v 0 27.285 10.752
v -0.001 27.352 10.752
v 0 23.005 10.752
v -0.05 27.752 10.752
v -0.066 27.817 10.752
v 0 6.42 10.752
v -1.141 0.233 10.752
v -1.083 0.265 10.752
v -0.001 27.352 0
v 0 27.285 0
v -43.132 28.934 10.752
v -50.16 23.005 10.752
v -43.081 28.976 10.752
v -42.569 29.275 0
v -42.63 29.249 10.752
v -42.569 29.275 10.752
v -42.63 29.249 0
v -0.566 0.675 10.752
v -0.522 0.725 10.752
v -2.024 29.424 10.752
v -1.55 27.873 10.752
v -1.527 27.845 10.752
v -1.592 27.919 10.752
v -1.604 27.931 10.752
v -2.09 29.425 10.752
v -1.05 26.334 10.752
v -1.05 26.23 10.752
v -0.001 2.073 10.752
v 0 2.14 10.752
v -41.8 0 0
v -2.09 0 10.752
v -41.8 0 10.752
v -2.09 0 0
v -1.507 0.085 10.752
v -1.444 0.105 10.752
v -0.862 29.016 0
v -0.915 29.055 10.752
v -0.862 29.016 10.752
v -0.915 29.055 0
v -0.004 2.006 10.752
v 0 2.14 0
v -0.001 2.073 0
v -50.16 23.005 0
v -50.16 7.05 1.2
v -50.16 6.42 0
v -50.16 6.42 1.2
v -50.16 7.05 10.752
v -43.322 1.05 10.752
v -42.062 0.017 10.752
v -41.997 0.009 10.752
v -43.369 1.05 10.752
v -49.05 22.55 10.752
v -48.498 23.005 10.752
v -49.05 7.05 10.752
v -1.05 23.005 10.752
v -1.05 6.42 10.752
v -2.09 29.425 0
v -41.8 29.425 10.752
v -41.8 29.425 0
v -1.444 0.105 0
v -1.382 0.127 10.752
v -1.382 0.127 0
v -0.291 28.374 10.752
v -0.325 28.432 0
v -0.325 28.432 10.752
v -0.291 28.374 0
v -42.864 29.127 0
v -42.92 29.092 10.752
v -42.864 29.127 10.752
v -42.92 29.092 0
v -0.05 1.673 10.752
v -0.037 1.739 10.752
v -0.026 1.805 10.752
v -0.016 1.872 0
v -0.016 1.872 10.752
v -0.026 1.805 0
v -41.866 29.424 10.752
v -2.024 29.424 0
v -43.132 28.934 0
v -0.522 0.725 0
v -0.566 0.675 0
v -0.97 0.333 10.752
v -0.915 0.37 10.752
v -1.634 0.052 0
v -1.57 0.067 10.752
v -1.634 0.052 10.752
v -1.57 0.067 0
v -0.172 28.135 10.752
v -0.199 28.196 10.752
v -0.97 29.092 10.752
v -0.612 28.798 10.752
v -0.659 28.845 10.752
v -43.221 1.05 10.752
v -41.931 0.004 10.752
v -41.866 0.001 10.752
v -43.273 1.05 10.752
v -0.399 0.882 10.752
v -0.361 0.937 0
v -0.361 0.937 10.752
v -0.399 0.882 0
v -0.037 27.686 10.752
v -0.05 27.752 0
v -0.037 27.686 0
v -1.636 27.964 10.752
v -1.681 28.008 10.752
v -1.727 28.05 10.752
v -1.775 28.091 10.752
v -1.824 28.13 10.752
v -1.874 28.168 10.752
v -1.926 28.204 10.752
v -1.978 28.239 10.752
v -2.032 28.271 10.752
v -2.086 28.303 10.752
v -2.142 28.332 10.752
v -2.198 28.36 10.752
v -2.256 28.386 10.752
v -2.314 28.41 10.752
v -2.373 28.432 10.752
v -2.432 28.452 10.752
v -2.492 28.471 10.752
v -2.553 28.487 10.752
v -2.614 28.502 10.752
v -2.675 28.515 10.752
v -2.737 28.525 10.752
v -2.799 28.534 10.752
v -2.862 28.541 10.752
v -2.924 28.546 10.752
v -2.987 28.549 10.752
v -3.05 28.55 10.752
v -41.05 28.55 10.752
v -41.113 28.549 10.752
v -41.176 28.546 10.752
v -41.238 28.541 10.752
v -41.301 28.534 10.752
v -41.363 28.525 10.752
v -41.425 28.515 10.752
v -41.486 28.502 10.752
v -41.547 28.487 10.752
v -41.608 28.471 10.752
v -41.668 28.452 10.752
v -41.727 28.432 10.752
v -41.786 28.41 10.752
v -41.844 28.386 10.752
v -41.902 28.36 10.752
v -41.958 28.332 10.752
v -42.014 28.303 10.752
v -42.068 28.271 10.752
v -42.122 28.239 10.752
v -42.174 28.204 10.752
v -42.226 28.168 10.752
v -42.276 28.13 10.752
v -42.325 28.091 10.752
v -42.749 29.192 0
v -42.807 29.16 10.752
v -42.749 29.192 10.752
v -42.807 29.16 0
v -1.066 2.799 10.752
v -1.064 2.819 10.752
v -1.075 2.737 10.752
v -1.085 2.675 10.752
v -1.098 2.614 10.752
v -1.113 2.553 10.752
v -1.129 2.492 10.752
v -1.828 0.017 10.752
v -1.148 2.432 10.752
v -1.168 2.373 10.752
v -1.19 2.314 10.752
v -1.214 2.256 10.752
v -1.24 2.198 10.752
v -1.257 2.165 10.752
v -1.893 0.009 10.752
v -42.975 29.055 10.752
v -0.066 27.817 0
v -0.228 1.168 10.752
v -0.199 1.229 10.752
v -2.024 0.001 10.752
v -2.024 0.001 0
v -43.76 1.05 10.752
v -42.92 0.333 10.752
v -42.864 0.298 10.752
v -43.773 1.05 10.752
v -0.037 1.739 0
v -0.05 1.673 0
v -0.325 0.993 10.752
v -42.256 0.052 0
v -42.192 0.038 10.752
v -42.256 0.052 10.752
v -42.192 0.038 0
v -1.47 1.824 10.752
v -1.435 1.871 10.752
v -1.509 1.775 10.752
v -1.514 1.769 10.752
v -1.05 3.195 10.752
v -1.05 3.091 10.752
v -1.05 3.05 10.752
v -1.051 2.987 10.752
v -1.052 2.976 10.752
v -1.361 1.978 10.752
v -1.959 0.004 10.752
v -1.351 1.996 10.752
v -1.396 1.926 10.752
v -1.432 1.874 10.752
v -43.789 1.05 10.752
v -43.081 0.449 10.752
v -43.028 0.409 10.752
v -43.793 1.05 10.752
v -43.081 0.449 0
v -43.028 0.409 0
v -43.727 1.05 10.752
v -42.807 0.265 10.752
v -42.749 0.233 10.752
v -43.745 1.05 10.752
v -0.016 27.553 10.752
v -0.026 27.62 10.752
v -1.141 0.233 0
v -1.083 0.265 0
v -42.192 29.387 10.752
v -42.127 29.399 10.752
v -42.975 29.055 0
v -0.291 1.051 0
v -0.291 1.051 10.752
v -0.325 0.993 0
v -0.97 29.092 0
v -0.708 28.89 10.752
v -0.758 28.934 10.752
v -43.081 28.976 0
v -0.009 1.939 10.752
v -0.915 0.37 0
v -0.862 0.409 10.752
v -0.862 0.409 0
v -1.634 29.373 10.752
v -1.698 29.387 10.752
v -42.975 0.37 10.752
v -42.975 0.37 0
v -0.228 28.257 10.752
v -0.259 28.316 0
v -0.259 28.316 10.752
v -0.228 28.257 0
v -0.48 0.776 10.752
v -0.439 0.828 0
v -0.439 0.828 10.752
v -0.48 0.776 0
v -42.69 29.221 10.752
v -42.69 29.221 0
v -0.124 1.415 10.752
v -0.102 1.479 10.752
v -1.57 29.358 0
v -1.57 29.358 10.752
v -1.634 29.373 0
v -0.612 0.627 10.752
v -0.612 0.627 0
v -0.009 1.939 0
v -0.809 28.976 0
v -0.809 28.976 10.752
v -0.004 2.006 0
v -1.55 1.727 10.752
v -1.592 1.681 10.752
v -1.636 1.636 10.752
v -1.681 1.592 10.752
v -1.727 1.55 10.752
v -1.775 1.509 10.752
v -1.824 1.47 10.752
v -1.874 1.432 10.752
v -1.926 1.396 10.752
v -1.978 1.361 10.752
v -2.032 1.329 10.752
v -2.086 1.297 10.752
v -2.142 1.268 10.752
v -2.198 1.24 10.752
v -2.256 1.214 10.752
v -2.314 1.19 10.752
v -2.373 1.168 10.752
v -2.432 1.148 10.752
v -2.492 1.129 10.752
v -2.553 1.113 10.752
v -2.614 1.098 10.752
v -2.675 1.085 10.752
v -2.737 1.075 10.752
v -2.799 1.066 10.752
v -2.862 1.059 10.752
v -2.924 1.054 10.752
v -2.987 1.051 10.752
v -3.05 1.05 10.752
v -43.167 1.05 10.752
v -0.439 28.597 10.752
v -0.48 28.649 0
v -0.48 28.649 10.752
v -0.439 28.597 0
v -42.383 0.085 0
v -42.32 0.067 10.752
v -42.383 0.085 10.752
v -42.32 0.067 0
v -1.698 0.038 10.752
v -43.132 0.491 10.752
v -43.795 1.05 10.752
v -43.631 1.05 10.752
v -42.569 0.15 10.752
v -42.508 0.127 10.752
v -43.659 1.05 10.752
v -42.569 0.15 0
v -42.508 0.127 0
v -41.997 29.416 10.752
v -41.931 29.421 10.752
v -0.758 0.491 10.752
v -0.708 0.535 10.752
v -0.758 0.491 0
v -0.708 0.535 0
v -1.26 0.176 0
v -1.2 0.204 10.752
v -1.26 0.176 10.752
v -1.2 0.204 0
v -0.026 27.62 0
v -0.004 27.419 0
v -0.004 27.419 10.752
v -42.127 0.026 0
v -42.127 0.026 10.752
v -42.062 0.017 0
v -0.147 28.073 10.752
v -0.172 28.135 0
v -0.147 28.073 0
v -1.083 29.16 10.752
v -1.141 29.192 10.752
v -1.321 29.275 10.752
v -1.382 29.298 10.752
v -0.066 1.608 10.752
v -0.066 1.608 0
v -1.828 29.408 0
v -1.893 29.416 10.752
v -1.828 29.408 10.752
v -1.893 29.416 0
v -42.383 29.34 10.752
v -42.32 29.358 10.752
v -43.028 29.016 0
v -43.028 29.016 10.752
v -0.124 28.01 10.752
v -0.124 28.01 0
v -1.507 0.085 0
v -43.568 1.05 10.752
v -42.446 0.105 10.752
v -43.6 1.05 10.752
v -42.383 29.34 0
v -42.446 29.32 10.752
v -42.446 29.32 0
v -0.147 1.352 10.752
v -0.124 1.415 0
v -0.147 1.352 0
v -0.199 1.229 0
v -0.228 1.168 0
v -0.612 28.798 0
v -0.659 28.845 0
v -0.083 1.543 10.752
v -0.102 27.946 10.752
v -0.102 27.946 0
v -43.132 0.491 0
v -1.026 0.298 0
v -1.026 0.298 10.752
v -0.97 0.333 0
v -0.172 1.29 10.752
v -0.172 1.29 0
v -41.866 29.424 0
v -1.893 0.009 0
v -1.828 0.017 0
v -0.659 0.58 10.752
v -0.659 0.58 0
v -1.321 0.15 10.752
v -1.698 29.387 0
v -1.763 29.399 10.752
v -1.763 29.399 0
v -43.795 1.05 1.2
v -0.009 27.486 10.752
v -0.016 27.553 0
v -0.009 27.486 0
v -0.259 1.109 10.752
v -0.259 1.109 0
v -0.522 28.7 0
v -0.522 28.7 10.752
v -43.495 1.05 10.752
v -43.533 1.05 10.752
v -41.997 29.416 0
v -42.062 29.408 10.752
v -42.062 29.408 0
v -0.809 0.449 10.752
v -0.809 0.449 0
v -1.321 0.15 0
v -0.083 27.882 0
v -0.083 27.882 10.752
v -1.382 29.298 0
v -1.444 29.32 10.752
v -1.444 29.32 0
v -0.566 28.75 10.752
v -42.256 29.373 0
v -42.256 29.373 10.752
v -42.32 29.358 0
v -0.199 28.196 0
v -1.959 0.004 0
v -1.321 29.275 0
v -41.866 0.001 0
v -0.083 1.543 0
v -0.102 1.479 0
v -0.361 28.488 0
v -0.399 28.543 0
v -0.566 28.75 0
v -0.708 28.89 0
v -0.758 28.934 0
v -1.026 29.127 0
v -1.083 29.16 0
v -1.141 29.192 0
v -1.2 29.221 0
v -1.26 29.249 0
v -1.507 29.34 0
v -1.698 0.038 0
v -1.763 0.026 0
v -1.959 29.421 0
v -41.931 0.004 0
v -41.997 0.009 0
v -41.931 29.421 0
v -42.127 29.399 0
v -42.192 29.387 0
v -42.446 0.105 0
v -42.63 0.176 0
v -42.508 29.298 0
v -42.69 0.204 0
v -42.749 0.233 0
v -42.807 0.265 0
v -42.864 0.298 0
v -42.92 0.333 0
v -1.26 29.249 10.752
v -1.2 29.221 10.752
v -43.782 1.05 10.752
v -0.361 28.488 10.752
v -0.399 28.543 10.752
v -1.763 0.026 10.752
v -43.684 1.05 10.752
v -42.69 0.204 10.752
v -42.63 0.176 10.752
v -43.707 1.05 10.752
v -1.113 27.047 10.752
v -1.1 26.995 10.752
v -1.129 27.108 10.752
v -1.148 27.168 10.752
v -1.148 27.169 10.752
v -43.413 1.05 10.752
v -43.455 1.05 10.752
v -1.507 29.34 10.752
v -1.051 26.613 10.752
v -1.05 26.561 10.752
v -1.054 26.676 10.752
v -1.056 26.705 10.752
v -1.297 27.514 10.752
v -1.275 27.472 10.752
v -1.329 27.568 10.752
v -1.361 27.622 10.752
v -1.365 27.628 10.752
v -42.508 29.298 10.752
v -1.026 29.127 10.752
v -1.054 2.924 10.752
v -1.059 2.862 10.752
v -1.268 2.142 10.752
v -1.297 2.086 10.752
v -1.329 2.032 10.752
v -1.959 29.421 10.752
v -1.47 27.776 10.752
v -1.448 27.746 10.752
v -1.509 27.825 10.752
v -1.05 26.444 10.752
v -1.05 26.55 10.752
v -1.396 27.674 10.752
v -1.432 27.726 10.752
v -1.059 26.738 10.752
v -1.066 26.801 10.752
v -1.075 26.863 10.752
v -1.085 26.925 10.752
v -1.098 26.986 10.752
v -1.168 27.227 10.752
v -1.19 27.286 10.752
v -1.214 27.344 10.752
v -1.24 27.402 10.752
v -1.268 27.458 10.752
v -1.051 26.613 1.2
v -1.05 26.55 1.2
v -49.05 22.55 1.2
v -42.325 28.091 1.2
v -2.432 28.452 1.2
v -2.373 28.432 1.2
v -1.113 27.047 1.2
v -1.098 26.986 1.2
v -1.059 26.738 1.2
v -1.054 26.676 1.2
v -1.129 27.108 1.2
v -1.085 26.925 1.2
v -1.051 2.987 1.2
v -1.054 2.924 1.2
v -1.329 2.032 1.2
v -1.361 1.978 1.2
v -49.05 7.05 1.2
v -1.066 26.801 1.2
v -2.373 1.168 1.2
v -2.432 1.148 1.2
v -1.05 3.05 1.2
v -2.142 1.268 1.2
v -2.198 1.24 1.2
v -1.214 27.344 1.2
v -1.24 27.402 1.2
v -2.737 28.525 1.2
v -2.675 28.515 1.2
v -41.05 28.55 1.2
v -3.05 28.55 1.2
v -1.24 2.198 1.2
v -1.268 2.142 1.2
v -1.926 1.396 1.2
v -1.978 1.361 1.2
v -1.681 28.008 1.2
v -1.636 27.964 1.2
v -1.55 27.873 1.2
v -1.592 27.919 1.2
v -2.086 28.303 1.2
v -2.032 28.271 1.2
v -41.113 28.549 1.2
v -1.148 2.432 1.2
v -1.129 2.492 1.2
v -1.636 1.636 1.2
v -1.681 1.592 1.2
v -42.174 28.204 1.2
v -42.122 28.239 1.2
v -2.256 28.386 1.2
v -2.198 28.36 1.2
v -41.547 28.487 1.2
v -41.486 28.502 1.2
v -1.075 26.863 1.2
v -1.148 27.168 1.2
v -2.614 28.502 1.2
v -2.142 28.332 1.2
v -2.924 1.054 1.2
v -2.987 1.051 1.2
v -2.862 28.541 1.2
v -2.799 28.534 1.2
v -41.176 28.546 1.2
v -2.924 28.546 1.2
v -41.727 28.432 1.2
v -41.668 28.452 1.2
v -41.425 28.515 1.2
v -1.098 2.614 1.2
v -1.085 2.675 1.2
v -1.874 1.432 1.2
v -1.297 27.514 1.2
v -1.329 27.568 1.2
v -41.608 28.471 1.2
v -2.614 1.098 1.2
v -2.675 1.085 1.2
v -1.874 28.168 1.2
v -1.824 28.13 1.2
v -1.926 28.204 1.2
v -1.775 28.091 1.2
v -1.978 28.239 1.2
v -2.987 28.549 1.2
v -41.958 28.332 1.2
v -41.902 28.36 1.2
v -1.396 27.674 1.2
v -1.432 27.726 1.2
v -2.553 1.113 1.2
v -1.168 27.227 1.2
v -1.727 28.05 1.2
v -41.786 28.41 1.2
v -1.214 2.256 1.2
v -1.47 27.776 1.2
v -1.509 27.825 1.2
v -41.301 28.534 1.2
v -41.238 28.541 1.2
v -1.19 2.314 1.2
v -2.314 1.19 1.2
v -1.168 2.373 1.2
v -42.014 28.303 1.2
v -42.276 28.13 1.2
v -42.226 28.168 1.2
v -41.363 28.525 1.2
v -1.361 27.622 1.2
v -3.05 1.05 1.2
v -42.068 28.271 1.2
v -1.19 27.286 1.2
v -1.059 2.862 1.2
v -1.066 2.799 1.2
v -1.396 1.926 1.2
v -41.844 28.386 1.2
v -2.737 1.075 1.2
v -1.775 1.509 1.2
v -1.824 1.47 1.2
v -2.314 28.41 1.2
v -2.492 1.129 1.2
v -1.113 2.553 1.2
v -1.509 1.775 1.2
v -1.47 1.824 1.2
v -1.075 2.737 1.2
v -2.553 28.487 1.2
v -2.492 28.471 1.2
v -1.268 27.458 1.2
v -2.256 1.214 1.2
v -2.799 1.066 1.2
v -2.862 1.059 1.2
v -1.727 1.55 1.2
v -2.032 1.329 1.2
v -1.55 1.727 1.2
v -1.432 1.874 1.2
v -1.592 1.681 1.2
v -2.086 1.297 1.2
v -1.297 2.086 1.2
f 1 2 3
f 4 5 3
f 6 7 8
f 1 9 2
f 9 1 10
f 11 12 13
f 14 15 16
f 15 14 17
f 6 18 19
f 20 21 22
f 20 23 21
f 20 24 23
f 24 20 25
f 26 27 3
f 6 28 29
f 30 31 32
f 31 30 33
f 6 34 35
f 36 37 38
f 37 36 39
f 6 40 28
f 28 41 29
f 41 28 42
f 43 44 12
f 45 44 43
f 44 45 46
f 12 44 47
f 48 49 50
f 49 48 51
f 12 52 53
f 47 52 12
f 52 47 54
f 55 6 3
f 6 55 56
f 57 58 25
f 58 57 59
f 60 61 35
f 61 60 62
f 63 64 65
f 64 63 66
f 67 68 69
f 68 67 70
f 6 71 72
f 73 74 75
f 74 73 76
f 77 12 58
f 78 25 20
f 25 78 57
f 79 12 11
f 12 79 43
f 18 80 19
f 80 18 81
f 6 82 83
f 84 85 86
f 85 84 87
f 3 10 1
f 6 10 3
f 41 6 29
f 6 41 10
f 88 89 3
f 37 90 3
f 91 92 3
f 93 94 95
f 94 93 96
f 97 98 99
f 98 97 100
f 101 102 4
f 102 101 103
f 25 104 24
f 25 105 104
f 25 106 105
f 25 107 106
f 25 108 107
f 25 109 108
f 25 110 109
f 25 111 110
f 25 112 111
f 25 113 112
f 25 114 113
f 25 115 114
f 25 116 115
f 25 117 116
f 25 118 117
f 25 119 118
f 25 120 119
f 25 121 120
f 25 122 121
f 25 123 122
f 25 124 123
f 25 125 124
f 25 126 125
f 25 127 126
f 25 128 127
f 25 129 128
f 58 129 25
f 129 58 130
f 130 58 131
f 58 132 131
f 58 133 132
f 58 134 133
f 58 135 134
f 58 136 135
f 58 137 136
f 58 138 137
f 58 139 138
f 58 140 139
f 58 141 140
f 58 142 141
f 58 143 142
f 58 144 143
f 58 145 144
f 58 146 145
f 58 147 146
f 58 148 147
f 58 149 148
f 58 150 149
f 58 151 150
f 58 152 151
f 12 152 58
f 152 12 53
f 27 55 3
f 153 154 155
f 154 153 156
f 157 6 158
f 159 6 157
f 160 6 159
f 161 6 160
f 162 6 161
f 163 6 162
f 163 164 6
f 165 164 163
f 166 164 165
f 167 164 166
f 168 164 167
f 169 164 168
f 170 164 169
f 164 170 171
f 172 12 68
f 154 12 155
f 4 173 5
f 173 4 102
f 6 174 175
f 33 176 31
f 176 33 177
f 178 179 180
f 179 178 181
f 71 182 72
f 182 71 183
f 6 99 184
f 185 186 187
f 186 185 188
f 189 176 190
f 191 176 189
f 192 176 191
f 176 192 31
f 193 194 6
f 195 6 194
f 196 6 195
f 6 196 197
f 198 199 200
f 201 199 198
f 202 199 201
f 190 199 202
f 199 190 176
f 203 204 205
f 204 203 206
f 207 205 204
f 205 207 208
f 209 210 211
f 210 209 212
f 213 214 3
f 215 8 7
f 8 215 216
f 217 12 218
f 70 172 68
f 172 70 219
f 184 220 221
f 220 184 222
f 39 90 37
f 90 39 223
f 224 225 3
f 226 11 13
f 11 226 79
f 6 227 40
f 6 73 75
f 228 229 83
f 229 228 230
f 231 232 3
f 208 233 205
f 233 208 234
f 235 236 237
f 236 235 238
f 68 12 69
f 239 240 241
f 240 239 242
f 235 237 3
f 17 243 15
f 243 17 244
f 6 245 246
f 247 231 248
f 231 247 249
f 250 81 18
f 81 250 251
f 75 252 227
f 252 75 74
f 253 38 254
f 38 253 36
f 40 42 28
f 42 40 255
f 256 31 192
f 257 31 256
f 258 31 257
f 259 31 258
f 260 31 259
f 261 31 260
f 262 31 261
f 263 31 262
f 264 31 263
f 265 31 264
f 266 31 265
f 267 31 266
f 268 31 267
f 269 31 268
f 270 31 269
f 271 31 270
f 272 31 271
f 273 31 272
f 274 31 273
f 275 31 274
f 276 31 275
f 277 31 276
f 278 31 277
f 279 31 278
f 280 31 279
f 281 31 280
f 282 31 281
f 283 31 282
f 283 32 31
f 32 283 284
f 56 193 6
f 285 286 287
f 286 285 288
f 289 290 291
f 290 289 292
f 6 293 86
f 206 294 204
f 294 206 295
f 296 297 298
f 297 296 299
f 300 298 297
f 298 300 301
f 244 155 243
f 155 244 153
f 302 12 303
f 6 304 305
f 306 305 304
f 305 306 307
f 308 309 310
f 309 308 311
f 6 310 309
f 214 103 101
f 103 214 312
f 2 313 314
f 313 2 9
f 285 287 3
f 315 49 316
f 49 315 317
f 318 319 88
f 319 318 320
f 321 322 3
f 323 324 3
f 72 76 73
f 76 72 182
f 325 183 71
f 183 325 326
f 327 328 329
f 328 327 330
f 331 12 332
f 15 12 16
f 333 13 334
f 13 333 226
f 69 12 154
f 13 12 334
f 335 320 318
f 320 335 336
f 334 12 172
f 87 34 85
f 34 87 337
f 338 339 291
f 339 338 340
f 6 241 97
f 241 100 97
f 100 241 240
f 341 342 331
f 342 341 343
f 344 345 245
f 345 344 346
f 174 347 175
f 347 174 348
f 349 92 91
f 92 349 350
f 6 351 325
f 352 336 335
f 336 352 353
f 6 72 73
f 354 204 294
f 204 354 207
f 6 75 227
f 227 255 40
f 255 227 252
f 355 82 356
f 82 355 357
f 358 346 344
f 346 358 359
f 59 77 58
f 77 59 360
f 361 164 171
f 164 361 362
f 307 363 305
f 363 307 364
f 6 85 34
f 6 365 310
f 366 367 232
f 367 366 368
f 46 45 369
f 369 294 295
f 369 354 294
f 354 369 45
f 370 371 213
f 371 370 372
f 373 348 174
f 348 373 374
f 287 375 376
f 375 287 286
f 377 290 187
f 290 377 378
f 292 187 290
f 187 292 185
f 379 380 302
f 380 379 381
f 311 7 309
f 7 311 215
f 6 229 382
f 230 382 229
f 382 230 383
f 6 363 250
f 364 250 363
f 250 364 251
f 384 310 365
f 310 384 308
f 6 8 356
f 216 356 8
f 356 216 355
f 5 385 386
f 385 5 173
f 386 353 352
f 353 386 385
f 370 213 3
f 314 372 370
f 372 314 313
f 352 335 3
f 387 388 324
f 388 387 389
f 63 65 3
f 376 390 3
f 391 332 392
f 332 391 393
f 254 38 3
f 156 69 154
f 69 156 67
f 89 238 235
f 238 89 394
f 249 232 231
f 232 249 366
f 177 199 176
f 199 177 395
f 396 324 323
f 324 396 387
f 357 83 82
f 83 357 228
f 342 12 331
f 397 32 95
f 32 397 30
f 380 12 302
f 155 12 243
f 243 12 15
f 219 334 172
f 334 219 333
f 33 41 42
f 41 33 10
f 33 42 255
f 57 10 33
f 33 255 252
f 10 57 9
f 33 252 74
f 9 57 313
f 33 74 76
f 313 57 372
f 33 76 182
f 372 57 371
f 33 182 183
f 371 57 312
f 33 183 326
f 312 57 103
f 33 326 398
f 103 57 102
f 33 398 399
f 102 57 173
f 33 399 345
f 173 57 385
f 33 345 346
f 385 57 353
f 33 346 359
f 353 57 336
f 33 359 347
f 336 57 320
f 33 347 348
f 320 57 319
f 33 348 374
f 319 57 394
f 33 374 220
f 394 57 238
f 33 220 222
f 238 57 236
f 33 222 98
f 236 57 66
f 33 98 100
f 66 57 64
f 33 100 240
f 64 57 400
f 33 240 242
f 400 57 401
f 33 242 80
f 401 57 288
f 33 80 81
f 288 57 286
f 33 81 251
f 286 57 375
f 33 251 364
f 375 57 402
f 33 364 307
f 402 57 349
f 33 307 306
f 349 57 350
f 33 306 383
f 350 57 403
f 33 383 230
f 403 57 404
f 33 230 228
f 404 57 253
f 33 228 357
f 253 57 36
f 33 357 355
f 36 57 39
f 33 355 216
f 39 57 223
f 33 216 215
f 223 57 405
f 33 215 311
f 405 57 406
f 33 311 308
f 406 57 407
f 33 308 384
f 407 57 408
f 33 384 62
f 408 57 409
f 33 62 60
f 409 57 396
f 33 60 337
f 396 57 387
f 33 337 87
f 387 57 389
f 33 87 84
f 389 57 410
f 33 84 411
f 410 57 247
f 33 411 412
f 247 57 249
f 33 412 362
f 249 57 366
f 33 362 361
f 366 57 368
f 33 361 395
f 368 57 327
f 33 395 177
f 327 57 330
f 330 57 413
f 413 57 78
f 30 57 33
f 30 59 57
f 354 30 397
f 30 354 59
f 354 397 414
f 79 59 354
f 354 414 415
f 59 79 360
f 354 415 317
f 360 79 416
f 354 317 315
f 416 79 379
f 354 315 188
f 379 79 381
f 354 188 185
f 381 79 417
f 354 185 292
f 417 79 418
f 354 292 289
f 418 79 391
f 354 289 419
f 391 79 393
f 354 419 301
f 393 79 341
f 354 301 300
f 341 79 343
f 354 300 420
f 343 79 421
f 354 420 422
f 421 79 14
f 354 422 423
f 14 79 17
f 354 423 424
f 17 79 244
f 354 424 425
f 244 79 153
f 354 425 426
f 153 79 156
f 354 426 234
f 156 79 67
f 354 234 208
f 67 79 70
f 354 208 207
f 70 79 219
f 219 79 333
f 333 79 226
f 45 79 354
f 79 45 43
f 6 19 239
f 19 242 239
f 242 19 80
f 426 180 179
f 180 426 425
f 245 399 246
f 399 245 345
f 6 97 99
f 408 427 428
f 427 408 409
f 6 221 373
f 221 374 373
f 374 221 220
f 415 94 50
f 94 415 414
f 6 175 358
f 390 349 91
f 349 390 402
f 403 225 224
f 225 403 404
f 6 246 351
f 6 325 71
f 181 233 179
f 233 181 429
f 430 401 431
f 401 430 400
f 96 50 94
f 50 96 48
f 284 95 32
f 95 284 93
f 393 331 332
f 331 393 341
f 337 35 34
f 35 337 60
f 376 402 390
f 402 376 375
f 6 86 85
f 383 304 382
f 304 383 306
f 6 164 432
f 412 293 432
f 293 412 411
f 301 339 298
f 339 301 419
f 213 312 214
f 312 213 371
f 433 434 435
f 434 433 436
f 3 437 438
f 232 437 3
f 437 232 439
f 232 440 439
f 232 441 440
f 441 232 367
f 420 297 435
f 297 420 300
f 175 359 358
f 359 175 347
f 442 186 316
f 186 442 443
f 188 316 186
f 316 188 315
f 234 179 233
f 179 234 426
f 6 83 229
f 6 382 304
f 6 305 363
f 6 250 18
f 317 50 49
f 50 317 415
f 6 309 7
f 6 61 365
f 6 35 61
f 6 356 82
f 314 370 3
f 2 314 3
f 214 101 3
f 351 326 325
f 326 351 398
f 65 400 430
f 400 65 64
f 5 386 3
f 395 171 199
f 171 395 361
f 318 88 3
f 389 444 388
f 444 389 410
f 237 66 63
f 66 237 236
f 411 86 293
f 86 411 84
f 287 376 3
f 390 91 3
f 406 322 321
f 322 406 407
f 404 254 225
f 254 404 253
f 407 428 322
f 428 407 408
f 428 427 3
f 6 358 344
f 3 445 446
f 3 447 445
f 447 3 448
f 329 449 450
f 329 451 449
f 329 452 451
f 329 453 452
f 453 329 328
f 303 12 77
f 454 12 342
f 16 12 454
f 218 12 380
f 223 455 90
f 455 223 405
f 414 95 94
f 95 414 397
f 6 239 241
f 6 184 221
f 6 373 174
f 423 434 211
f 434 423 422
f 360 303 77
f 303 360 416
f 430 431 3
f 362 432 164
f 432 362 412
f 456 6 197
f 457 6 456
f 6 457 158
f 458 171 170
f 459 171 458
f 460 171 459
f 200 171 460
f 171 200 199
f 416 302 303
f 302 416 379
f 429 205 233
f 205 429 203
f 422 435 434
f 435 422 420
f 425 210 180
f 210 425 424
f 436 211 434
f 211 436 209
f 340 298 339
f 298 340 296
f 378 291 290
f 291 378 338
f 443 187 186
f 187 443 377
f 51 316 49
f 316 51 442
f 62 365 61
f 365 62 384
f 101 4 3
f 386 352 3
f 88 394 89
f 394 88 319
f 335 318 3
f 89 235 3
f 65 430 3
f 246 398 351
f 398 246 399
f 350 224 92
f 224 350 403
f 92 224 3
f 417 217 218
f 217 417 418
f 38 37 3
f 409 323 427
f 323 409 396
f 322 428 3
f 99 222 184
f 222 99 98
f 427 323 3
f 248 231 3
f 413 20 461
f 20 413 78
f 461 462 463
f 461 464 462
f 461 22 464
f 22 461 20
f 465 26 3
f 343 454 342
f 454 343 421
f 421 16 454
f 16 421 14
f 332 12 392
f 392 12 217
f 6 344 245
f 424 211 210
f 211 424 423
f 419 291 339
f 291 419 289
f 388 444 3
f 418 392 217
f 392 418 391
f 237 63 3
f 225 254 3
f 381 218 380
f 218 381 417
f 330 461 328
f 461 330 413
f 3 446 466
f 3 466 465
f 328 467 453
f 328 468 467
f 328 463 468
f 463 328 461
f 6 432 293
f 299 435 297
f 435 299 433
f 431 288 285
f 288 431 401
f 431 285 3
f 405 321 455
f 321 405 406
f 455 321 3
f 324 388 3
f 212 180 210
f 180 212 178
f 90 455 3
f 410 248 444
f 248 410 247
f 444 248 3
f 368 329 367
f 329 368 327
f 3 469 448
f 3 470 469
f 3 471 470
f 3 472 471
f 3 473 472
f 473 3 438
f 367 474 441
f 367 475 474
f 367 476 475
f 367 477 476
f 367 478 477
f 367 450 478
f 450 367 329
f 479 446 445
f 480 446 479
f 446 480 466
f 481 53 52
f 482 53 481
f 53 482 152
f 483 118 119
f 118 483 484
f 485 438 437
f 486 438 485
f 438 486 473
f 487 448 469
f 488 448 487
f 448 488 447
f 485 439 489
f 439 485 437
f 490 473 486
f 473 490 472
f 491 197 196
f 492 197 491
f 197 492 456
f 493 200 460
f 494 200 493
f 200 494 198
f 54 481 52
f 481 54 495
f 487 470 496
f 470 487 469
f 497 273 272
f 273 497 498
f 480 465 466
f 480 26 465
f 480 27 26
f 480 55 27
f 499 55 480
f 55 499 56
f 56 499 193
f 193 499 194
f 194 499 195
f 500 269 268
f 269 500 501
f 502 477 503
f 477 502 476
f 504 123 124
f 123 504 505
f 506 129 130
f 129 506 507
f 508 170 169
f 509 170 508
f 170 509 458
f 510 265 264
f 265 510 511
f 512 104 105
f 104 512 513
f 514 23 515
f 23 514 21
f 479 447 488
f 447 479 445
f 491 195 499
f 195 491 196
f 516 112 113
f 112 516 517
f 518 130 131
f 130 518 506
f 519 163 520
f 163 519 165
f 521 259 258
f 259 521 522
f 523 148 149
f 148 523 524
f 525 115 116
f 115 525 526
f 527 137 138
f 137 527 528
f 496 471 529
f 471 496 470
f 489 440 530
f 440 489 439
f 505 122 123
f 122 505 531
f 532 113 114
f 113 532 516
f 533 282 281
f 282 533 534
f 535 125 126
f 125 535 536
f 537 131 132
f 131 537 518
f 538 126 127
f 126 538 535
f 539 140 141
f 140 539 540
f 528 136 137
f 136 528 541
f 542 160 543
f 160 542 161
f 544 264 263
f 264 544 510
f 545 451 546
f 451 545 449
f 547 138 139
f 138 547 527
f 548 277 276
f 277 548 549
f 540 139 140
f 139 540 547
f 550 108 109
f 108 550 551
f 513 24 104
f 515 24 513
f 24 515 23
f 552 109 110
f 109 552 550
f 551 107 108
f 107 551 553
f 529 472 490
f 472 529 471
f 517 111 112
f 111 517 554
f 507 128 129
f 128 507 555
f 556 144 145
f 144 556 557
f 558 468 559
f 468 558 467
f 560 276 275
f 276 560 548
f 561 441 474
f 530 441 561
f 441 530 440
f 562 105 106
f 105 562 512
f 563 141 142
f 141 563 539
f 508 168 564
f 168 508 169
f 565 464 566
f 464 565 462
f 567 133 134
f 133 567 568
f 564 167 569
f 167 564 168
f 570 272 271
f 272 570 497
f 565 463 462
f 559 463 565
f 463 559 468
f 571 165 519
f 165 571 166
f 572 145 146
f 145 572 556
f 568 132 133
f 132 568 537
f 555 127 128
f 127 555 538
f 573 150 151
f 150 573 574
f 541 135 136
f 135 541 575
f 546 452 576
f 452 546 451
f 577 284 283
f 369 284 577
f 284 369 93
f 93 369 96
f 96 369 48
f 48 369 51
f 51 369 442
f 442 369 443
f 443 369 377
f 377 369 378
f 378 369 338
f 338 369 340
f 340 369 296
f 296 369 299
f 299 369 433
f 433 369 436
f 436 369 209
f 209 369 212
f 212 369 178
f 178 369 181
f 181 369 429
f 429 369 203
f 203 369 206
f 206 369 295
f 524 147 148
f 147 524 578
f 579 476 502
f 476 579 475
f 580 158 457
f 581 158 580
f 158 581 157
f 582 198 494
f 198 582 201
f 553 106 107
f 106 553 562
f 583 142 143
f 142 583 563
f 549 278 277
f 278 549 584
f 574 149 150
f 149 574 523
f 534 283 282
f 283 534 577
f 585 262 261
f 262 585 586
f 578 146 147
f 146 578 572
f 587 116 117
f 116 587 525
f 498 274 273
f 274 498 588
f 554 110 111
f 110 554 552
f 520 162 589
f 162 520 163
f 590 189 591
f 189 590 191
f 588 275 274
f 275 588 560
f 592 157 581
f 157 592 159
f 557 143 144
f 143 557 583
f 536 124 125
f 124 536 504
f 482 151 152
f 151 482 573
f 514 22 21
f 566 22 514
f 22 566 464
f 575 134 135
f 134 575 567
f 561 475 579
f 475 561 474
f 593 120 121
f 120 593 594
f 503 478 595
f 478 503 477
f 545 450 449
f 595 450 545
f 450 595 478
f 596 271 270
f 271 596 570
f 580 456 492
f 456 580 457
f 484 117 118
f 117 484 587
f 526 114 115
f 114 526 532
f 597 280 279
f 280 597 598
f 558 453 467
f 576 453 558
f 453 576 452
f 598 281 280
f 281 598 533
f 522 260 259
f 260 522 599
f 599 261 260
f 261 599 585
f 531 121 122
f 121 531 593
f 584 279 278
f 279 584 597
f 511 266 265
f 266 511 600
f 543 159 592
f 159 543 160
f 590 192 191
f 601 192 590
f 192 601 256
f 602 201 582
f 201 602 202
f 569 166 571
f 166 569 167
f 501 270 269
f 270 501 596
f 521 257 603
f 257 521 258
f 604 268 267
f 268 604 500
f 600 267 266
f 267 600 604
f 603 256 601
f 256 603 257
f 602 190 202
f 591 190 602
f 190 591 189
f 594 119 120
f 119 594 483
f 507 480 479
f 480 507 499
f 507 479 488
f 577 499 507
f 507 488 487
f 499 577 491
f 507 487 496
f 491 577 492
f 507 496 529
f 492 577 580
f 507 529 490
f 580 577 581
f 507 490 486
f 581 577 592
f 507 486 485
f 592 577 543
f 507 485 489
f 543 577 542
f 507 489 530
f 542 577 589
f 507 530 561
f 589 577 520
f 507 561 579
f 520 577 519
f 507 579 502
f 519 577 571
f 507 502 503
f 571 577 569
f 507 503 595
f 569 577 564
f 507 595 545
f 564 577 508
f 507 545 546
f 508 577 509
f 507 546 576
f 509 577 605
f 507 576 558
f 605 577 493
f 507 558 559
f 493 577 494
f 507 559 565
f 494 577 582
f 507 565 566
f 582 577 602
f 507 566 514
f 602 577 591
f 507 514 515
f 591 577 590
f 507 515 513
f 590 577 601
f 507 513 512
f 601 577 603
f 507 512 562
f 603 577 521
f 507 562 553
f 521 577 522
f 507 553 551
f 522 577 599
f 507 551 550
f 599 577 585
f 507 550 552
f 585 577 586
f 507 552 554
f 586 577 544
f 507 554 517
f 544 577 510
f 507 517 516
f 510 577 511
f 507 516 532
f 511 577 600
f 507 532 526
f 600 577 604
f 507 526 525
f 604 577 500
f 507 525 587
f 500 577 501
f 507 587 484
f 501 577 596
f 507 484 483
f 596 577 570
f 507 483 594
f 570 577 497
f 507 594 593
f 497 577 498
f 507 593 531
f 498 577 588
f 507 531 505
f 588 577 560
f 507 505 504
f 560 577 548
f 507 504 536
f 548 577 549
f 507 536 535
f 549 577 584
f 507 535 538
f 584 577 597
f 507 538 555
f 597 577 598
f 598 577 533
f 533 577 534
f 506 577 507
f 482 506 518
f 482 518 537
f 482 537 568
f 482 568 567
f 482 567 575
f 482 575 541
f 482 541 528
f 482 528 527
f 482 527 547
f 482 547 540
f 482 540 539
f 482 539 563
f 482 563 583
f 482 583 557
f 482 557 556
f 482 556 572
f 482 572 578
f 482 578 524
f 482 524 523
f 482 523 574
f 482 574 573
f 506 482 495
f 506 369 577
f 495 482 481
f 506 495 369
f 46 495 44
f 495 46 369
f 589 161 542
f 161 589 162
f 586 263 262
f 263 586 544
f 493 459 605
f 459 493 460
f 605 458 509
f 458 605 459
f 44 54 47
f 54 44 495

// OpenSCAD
// file: ../sc.scad
// ShortCuts.scad 
// Autor: Rudolf Huttary, Berlin 2015
//
$fn = 100; 

//show_examples(); 

module show_examples()
	place_in_rect(30, 30)
	{
		Cy(h = 10); 
		CyH(h = 10); 
		CyH(h = 10, w = 30); 
		CyS(h = 10); 
		CyS(h = 10, w1 = 25, w2 = 75); 
		Cu(10); 
		Ri(h = 10); 
		RiH(h = 10); 
		RiS(h = 10, w1 = 10); 
		RiS(h = 10, w1 = 30, w2 = 300); 
		Sp(); 
		SpH(10, 30, 30); 
	}


module help()
{
echo("==============="); 
echo("help(): shows this help"); 
echo("show_examples(): shows some examples"); 
echo("place_in_rect(): places children objects in grid"); 
echo("Transformations:"); 
echo(" transform :  T(x=0, y=0, z=0), Tx(x=0) , Ty(y=0), Tz(z=0)"); 
echo(" rotate :  R(x=0, y=0, z=0), Rx(x=0) , Ry(y=0), Rz(z=0)"); 
echo(" scale :  S(x=1, y=1, z=1), Sx(x=1) , Sy(y=1), Sz(z=1)"); 
echo("Logical"); 
echo(" difference :  D()"); 
echo(" union :  U()"); 
echo(" intersection : *missing*"); 
echo("Primitives"); 
echo(" circle :  Ci(r=10)"); 
echo(" circle_half :  CiH(r=10, w=0)")
echo(" circle_segment :  CiS(r=10, w1=0, w2=90)")
echo(" square :  Sq(x=10, y=0, center=true))"); 
echo(" cylinder :  Cy(r=10, h=1, center=true)"); 
echo(" cylinder_half :  CyH(r=10, w=0)")
echo(" cylinder_segment: CyS(r=10, h=1, w1=0, w2=90,center=true)"); 
echo(" cylinder_segment: Pie(r=10, h=1, w1=0, w2=90,center=true)"); 
echo(" cube :  Cu(x=10, y=0, z=10, center=true)"); 
echo(" ring :  Ri(R=10, r=5, h=1, center=true)"); 
echo(" ring_half :  RiH(R=10, r=5, h=1, w=0 center=true)"); 
echo(" ring_segment :  RiS(R=10, r=5, h=1, w1=0, w2=90, center=true)"); 
echo(" sphere:  Sp(r=10))"); 
echo(" sphere_half:  SpH(r=10, w1 = 0, w2 = 0))"); 
echo("==============="); 
}

// Euclidean Transformations
module T(x=0, y=0, z=0){translate([x, y, z])children(); }
module Tx(x) { translate([x, 0, 0])children(); }
module Ty(y) { translate([0, y, 0])children(); }
module Tz(z) { translate([0, 0, z])children(); }

module R(x=0, y=0, z=0){rotate([x, y, z]) children();}
module Rx(x=90){rotate([x, 0, 0]) children();}
module Ry(y=90){rotate([0, y, 0]) children();}
module Rz(z=90){rotate([0, 0, z]) children();}

module M(x=0, y=0, z=0){mirror([x, y, z]) children();}
module Mx(x=1){mirror([x, 0, 0]) children();}
module My(y=1){mirror([0, y, 0]) children();}
module Mz(z=1){mirror([0, 0, z]) children();}

module S(x=1, y=1, z=1){scale([x, y, z]) children();}
module Sx(x=1){scale([x, 1, 1]) children();}
module Sy(y=1){scale([1, y, 1]) children();}
module Sz(z=1){scale([1, 1, z]) children();}

module D() difference(){children(0); children([1:$children-1]);}
module U() children([0:$children-1]);
// module I() intersection()children([0:$children-1]); // does not work for some reason


// primitives - 2D

module Sq(x =10, y = 0, center = false)
{
   if(y==0)
		square([x, x], center = center); 
	else
		square([x, y], center = center); 
}
module Ci(r = 10)
{
	circle(r = r); 
}

// derived primitives - 2d
module CiH(r = 10, w = 0)
  circle_half(r, w); 

module CiS(r = 10, w1 = 0, w2 = 90)
  circle_segment(r, w1, w2); 


// primitives - 3d
module Cy(r = 10, h = 1, center = false)
{
	cylinder(r = r, h = h, center = center); 
}
module Cu(x = 10, y = 0, z = 10, center = false)
{
  if (y==0)
	cube([x, x, x], center = center); 
  else
	cube([x, y, z], center = center); 
}

// derived primitives - 3d
module CyH(r = 10, h = 1, w = 0, center = false)
  cylinder_half(r, h, w, center); 

module CyS(r = 10, h = 1, w1 = 0, w2 = 90, center = false)
  cylinder_segment(r, h, w1, w2, center); 

module Ri(R = 10, r = 5, h = 1, center = false)
  ring(R, r, h, center); 

module RiS(R = 10, r = 5, h = 1, w1 = 0, w2 = 90, center = false)
   ring_segment(R, r, h, w1, w2, center); 

module RiH(r1 = 10, r2, h = 1, w = 0, center = false)
   ring_half(r1, r2, h, w, center); 
module Pie(r = 10, h = 1, w1 = 0, w2 = 90, center = false)
  cylinder_segment(r, h, w1, w2, center);  
module Sp(r = 10)
  sphere(r); 
module SpH(r = 10, w1 = 0, w2 = 0)
  sphere_half(r, w1, w2); 
module SpS(r = 10, w1 = 0, w2 = 90, w3 = 90)
  sphere_segment(r, w1, w2); 




// clear text definitions
module circle_half(r = 10, w = 0)
{
	difference()
	{
		circle(r); 
     rotate([0, 0, w-90])
     translate([0, -r])
		square([r, 2*r], center = false); 
	}
}

module circle_segment(r = 10, w1 = 0, w2 = 90)
{
  W2 = (w1>w2)?w2+360:w2; 
  if (W2-w1 < 180)
    intersection()
		{
       circle_half(r, w1); 
       circle_half(r, W2-180); 
 		}
	else
    union()
		{
       circle_half(r, w1); 
       circle_half(r, W2-180); 
 		}
}

module cylinder_half(r = 10, h = 1, w = 0, center = true)
{
  linear_extrude(height = h, center = center)
  circle_half(r, w); 
} 

module cylinder_segment(r = 10, h = 1, w1 = 0, w2 = 90, center = true)
{
  linear_extrude(height = h, center = center)
  circle_segment(r, w1, w2); 
} 

module ring(R = 10, r = 5, h = 1, center = true)
{
	difference()
	{
	cylinder(r = R, h = h, center = center); 
   translate([0, 0, -2*h])
	cylinder(r = r, h = 4*h, center = false); 
	}
}

module ring_half(R = 10, r = 5, h = 1, w = 0, center = true)
{
	difference()
	{
		ring(R, r, h, center); 
     rotate([0, 0, w])
     translate([0, -R/2, 0])
		cube([2*R, R, 3*h], center = true); 
	}
}

module ring_segment(R = 10, r = 5, h = 1, w1 = 0, w2 = 90, center = true)
{
  W2 = (w1>w2)?w2+360:w2; 
  if (W2-w1 < 180)
    intersection()
		{
       ring_half(R, r, h, w1, center); 
       ring_half(R, r, h, W2-180, center); 
 		}
	else
    union()
		{
       ring_half(R, r, h, w1, center); 
       ring_half(R, r, h, W2-180, center); 
 		}
}


module sphere_half(r = 10, w1 = 0, w2 = 0)
{  
	difference()
	{
   	sphere(r); 
      rotate([-w1, -w2, 0])
     	translate([0, 0, r])
		cube([2*r, 2*r, r], center = true); 
	}

}


// additional code
module place_in_rect(dx =20, dy=20)
{
  cols = ceil(sqrt($children)); 
  rows = floor(sqrt($children)); 
  for(i = [0:$children-1])
	{ 
	  T(dx*(-cols/2+(i%cols)+.5), dy*(rows/2-floor(i/cols)-.5))
		 children(i); 
	}
}
// main file
/* [Plug Options] */
//The width of the plug, in mm (The long way)
plugWidth=48;
//The height of the plug, in mm (The short way)
plugHeight=27.5;
//How far the angles on the plug should go, measured along the x axis from the right, in mm
plugChamfer=6;
//At 0, the plug will be in the bottom right corner, but not hitting the chamfer or the interior. This moves the plug left, in mm.
plugXOffset=5;
//Moves the plug up, in mm
plugZOffset=5;

/* [Size Options] */
thickness=3.84;
width=80;
height=95;

/* [Hidden] */
use <../lib.scad>
$fn=100;
/*
translate([0,-20-thickness,0]){
%scube(100,20,20);
%scube(20,20,100);
}
/**/
//switch();
cap();

module cap(){
    difference(){
        mirror([1,0,0])
        scale([1.045,1.07,0.7]) plug();
        
        mirror([1,0,0])
        translate([1.05,1.05,1.2]) plug();
        
        translate([-60,1.05,1.2]) cube([30,6,20]);
    }
}

module test(){
    difference(){
        rotate([90,0,0])
        translate([20,20,0])
        rcube(width-30,height-30,thickness,1);
        
        translate([width-20-plugWidth/2,thickness*2, height-20]) rotate([0,90,-90]) 
        plug();
    }
}
        
module plug(){
    hull(){
        rcube(plugWidth-plugChamfer,plugHeight,thickness*4,2);
        
        translate([0,plugChamfer,0])
          scube(plugWidth,plugHeight-2*plugChamfer,thickness*4);
    };
}

module switch(){
    difference()
    {
        rotate([90,0,0])
        union(){
            rcube(width,height,thickness,1);

            translate([20,20,thickness])
            difference(){
                rcube(width-20,height-20,20,1);
                
                translate([thickness,thickness,-.1])
                rcube(width-20-(2*thickness),height-20-(2*thickness),21,1);
                
                translate([thickness,height/2-20,20-2])
                rotate([-90,0,0])
                cylinder(d=2,h=20);
                translate([width-20-thickness,height/2-20,20-2])
                rotate([-90,0,0])
                cylinder(d=2,h=20);
            }
        }
        /************************************/
        // Plug
        translate([width-20-plugWidth/2,thickness*2, height-18]) 
        rotate([0,90,-90]) 
        plug();
        
        // Screws
        translate([30,0,10]) rotate([90,0,0])
        cylinder(d=5.5, h=20,center=true);
        translate([width-10,0,10]) rotate([90,0,0])
        cylinder(d=5.5, h=20,center=true);

        translate([10,0,30]) rotate([90,0,0])
        cylinder(d=5.5, h=20,center=true);
        translate([10,0,height-10]) rotate([90,0,0])
        cylinder(d=5.5, h=20,center=true);
        
         // lateral screw
        translate([19,-20-thickness+10-3.5,height-20])
        rcube(11,7,11,.1,0);
        translate([width-20,-20-thickness+10-3.5,19])
        rcube(11,7,11,.1,0);
    }
}
